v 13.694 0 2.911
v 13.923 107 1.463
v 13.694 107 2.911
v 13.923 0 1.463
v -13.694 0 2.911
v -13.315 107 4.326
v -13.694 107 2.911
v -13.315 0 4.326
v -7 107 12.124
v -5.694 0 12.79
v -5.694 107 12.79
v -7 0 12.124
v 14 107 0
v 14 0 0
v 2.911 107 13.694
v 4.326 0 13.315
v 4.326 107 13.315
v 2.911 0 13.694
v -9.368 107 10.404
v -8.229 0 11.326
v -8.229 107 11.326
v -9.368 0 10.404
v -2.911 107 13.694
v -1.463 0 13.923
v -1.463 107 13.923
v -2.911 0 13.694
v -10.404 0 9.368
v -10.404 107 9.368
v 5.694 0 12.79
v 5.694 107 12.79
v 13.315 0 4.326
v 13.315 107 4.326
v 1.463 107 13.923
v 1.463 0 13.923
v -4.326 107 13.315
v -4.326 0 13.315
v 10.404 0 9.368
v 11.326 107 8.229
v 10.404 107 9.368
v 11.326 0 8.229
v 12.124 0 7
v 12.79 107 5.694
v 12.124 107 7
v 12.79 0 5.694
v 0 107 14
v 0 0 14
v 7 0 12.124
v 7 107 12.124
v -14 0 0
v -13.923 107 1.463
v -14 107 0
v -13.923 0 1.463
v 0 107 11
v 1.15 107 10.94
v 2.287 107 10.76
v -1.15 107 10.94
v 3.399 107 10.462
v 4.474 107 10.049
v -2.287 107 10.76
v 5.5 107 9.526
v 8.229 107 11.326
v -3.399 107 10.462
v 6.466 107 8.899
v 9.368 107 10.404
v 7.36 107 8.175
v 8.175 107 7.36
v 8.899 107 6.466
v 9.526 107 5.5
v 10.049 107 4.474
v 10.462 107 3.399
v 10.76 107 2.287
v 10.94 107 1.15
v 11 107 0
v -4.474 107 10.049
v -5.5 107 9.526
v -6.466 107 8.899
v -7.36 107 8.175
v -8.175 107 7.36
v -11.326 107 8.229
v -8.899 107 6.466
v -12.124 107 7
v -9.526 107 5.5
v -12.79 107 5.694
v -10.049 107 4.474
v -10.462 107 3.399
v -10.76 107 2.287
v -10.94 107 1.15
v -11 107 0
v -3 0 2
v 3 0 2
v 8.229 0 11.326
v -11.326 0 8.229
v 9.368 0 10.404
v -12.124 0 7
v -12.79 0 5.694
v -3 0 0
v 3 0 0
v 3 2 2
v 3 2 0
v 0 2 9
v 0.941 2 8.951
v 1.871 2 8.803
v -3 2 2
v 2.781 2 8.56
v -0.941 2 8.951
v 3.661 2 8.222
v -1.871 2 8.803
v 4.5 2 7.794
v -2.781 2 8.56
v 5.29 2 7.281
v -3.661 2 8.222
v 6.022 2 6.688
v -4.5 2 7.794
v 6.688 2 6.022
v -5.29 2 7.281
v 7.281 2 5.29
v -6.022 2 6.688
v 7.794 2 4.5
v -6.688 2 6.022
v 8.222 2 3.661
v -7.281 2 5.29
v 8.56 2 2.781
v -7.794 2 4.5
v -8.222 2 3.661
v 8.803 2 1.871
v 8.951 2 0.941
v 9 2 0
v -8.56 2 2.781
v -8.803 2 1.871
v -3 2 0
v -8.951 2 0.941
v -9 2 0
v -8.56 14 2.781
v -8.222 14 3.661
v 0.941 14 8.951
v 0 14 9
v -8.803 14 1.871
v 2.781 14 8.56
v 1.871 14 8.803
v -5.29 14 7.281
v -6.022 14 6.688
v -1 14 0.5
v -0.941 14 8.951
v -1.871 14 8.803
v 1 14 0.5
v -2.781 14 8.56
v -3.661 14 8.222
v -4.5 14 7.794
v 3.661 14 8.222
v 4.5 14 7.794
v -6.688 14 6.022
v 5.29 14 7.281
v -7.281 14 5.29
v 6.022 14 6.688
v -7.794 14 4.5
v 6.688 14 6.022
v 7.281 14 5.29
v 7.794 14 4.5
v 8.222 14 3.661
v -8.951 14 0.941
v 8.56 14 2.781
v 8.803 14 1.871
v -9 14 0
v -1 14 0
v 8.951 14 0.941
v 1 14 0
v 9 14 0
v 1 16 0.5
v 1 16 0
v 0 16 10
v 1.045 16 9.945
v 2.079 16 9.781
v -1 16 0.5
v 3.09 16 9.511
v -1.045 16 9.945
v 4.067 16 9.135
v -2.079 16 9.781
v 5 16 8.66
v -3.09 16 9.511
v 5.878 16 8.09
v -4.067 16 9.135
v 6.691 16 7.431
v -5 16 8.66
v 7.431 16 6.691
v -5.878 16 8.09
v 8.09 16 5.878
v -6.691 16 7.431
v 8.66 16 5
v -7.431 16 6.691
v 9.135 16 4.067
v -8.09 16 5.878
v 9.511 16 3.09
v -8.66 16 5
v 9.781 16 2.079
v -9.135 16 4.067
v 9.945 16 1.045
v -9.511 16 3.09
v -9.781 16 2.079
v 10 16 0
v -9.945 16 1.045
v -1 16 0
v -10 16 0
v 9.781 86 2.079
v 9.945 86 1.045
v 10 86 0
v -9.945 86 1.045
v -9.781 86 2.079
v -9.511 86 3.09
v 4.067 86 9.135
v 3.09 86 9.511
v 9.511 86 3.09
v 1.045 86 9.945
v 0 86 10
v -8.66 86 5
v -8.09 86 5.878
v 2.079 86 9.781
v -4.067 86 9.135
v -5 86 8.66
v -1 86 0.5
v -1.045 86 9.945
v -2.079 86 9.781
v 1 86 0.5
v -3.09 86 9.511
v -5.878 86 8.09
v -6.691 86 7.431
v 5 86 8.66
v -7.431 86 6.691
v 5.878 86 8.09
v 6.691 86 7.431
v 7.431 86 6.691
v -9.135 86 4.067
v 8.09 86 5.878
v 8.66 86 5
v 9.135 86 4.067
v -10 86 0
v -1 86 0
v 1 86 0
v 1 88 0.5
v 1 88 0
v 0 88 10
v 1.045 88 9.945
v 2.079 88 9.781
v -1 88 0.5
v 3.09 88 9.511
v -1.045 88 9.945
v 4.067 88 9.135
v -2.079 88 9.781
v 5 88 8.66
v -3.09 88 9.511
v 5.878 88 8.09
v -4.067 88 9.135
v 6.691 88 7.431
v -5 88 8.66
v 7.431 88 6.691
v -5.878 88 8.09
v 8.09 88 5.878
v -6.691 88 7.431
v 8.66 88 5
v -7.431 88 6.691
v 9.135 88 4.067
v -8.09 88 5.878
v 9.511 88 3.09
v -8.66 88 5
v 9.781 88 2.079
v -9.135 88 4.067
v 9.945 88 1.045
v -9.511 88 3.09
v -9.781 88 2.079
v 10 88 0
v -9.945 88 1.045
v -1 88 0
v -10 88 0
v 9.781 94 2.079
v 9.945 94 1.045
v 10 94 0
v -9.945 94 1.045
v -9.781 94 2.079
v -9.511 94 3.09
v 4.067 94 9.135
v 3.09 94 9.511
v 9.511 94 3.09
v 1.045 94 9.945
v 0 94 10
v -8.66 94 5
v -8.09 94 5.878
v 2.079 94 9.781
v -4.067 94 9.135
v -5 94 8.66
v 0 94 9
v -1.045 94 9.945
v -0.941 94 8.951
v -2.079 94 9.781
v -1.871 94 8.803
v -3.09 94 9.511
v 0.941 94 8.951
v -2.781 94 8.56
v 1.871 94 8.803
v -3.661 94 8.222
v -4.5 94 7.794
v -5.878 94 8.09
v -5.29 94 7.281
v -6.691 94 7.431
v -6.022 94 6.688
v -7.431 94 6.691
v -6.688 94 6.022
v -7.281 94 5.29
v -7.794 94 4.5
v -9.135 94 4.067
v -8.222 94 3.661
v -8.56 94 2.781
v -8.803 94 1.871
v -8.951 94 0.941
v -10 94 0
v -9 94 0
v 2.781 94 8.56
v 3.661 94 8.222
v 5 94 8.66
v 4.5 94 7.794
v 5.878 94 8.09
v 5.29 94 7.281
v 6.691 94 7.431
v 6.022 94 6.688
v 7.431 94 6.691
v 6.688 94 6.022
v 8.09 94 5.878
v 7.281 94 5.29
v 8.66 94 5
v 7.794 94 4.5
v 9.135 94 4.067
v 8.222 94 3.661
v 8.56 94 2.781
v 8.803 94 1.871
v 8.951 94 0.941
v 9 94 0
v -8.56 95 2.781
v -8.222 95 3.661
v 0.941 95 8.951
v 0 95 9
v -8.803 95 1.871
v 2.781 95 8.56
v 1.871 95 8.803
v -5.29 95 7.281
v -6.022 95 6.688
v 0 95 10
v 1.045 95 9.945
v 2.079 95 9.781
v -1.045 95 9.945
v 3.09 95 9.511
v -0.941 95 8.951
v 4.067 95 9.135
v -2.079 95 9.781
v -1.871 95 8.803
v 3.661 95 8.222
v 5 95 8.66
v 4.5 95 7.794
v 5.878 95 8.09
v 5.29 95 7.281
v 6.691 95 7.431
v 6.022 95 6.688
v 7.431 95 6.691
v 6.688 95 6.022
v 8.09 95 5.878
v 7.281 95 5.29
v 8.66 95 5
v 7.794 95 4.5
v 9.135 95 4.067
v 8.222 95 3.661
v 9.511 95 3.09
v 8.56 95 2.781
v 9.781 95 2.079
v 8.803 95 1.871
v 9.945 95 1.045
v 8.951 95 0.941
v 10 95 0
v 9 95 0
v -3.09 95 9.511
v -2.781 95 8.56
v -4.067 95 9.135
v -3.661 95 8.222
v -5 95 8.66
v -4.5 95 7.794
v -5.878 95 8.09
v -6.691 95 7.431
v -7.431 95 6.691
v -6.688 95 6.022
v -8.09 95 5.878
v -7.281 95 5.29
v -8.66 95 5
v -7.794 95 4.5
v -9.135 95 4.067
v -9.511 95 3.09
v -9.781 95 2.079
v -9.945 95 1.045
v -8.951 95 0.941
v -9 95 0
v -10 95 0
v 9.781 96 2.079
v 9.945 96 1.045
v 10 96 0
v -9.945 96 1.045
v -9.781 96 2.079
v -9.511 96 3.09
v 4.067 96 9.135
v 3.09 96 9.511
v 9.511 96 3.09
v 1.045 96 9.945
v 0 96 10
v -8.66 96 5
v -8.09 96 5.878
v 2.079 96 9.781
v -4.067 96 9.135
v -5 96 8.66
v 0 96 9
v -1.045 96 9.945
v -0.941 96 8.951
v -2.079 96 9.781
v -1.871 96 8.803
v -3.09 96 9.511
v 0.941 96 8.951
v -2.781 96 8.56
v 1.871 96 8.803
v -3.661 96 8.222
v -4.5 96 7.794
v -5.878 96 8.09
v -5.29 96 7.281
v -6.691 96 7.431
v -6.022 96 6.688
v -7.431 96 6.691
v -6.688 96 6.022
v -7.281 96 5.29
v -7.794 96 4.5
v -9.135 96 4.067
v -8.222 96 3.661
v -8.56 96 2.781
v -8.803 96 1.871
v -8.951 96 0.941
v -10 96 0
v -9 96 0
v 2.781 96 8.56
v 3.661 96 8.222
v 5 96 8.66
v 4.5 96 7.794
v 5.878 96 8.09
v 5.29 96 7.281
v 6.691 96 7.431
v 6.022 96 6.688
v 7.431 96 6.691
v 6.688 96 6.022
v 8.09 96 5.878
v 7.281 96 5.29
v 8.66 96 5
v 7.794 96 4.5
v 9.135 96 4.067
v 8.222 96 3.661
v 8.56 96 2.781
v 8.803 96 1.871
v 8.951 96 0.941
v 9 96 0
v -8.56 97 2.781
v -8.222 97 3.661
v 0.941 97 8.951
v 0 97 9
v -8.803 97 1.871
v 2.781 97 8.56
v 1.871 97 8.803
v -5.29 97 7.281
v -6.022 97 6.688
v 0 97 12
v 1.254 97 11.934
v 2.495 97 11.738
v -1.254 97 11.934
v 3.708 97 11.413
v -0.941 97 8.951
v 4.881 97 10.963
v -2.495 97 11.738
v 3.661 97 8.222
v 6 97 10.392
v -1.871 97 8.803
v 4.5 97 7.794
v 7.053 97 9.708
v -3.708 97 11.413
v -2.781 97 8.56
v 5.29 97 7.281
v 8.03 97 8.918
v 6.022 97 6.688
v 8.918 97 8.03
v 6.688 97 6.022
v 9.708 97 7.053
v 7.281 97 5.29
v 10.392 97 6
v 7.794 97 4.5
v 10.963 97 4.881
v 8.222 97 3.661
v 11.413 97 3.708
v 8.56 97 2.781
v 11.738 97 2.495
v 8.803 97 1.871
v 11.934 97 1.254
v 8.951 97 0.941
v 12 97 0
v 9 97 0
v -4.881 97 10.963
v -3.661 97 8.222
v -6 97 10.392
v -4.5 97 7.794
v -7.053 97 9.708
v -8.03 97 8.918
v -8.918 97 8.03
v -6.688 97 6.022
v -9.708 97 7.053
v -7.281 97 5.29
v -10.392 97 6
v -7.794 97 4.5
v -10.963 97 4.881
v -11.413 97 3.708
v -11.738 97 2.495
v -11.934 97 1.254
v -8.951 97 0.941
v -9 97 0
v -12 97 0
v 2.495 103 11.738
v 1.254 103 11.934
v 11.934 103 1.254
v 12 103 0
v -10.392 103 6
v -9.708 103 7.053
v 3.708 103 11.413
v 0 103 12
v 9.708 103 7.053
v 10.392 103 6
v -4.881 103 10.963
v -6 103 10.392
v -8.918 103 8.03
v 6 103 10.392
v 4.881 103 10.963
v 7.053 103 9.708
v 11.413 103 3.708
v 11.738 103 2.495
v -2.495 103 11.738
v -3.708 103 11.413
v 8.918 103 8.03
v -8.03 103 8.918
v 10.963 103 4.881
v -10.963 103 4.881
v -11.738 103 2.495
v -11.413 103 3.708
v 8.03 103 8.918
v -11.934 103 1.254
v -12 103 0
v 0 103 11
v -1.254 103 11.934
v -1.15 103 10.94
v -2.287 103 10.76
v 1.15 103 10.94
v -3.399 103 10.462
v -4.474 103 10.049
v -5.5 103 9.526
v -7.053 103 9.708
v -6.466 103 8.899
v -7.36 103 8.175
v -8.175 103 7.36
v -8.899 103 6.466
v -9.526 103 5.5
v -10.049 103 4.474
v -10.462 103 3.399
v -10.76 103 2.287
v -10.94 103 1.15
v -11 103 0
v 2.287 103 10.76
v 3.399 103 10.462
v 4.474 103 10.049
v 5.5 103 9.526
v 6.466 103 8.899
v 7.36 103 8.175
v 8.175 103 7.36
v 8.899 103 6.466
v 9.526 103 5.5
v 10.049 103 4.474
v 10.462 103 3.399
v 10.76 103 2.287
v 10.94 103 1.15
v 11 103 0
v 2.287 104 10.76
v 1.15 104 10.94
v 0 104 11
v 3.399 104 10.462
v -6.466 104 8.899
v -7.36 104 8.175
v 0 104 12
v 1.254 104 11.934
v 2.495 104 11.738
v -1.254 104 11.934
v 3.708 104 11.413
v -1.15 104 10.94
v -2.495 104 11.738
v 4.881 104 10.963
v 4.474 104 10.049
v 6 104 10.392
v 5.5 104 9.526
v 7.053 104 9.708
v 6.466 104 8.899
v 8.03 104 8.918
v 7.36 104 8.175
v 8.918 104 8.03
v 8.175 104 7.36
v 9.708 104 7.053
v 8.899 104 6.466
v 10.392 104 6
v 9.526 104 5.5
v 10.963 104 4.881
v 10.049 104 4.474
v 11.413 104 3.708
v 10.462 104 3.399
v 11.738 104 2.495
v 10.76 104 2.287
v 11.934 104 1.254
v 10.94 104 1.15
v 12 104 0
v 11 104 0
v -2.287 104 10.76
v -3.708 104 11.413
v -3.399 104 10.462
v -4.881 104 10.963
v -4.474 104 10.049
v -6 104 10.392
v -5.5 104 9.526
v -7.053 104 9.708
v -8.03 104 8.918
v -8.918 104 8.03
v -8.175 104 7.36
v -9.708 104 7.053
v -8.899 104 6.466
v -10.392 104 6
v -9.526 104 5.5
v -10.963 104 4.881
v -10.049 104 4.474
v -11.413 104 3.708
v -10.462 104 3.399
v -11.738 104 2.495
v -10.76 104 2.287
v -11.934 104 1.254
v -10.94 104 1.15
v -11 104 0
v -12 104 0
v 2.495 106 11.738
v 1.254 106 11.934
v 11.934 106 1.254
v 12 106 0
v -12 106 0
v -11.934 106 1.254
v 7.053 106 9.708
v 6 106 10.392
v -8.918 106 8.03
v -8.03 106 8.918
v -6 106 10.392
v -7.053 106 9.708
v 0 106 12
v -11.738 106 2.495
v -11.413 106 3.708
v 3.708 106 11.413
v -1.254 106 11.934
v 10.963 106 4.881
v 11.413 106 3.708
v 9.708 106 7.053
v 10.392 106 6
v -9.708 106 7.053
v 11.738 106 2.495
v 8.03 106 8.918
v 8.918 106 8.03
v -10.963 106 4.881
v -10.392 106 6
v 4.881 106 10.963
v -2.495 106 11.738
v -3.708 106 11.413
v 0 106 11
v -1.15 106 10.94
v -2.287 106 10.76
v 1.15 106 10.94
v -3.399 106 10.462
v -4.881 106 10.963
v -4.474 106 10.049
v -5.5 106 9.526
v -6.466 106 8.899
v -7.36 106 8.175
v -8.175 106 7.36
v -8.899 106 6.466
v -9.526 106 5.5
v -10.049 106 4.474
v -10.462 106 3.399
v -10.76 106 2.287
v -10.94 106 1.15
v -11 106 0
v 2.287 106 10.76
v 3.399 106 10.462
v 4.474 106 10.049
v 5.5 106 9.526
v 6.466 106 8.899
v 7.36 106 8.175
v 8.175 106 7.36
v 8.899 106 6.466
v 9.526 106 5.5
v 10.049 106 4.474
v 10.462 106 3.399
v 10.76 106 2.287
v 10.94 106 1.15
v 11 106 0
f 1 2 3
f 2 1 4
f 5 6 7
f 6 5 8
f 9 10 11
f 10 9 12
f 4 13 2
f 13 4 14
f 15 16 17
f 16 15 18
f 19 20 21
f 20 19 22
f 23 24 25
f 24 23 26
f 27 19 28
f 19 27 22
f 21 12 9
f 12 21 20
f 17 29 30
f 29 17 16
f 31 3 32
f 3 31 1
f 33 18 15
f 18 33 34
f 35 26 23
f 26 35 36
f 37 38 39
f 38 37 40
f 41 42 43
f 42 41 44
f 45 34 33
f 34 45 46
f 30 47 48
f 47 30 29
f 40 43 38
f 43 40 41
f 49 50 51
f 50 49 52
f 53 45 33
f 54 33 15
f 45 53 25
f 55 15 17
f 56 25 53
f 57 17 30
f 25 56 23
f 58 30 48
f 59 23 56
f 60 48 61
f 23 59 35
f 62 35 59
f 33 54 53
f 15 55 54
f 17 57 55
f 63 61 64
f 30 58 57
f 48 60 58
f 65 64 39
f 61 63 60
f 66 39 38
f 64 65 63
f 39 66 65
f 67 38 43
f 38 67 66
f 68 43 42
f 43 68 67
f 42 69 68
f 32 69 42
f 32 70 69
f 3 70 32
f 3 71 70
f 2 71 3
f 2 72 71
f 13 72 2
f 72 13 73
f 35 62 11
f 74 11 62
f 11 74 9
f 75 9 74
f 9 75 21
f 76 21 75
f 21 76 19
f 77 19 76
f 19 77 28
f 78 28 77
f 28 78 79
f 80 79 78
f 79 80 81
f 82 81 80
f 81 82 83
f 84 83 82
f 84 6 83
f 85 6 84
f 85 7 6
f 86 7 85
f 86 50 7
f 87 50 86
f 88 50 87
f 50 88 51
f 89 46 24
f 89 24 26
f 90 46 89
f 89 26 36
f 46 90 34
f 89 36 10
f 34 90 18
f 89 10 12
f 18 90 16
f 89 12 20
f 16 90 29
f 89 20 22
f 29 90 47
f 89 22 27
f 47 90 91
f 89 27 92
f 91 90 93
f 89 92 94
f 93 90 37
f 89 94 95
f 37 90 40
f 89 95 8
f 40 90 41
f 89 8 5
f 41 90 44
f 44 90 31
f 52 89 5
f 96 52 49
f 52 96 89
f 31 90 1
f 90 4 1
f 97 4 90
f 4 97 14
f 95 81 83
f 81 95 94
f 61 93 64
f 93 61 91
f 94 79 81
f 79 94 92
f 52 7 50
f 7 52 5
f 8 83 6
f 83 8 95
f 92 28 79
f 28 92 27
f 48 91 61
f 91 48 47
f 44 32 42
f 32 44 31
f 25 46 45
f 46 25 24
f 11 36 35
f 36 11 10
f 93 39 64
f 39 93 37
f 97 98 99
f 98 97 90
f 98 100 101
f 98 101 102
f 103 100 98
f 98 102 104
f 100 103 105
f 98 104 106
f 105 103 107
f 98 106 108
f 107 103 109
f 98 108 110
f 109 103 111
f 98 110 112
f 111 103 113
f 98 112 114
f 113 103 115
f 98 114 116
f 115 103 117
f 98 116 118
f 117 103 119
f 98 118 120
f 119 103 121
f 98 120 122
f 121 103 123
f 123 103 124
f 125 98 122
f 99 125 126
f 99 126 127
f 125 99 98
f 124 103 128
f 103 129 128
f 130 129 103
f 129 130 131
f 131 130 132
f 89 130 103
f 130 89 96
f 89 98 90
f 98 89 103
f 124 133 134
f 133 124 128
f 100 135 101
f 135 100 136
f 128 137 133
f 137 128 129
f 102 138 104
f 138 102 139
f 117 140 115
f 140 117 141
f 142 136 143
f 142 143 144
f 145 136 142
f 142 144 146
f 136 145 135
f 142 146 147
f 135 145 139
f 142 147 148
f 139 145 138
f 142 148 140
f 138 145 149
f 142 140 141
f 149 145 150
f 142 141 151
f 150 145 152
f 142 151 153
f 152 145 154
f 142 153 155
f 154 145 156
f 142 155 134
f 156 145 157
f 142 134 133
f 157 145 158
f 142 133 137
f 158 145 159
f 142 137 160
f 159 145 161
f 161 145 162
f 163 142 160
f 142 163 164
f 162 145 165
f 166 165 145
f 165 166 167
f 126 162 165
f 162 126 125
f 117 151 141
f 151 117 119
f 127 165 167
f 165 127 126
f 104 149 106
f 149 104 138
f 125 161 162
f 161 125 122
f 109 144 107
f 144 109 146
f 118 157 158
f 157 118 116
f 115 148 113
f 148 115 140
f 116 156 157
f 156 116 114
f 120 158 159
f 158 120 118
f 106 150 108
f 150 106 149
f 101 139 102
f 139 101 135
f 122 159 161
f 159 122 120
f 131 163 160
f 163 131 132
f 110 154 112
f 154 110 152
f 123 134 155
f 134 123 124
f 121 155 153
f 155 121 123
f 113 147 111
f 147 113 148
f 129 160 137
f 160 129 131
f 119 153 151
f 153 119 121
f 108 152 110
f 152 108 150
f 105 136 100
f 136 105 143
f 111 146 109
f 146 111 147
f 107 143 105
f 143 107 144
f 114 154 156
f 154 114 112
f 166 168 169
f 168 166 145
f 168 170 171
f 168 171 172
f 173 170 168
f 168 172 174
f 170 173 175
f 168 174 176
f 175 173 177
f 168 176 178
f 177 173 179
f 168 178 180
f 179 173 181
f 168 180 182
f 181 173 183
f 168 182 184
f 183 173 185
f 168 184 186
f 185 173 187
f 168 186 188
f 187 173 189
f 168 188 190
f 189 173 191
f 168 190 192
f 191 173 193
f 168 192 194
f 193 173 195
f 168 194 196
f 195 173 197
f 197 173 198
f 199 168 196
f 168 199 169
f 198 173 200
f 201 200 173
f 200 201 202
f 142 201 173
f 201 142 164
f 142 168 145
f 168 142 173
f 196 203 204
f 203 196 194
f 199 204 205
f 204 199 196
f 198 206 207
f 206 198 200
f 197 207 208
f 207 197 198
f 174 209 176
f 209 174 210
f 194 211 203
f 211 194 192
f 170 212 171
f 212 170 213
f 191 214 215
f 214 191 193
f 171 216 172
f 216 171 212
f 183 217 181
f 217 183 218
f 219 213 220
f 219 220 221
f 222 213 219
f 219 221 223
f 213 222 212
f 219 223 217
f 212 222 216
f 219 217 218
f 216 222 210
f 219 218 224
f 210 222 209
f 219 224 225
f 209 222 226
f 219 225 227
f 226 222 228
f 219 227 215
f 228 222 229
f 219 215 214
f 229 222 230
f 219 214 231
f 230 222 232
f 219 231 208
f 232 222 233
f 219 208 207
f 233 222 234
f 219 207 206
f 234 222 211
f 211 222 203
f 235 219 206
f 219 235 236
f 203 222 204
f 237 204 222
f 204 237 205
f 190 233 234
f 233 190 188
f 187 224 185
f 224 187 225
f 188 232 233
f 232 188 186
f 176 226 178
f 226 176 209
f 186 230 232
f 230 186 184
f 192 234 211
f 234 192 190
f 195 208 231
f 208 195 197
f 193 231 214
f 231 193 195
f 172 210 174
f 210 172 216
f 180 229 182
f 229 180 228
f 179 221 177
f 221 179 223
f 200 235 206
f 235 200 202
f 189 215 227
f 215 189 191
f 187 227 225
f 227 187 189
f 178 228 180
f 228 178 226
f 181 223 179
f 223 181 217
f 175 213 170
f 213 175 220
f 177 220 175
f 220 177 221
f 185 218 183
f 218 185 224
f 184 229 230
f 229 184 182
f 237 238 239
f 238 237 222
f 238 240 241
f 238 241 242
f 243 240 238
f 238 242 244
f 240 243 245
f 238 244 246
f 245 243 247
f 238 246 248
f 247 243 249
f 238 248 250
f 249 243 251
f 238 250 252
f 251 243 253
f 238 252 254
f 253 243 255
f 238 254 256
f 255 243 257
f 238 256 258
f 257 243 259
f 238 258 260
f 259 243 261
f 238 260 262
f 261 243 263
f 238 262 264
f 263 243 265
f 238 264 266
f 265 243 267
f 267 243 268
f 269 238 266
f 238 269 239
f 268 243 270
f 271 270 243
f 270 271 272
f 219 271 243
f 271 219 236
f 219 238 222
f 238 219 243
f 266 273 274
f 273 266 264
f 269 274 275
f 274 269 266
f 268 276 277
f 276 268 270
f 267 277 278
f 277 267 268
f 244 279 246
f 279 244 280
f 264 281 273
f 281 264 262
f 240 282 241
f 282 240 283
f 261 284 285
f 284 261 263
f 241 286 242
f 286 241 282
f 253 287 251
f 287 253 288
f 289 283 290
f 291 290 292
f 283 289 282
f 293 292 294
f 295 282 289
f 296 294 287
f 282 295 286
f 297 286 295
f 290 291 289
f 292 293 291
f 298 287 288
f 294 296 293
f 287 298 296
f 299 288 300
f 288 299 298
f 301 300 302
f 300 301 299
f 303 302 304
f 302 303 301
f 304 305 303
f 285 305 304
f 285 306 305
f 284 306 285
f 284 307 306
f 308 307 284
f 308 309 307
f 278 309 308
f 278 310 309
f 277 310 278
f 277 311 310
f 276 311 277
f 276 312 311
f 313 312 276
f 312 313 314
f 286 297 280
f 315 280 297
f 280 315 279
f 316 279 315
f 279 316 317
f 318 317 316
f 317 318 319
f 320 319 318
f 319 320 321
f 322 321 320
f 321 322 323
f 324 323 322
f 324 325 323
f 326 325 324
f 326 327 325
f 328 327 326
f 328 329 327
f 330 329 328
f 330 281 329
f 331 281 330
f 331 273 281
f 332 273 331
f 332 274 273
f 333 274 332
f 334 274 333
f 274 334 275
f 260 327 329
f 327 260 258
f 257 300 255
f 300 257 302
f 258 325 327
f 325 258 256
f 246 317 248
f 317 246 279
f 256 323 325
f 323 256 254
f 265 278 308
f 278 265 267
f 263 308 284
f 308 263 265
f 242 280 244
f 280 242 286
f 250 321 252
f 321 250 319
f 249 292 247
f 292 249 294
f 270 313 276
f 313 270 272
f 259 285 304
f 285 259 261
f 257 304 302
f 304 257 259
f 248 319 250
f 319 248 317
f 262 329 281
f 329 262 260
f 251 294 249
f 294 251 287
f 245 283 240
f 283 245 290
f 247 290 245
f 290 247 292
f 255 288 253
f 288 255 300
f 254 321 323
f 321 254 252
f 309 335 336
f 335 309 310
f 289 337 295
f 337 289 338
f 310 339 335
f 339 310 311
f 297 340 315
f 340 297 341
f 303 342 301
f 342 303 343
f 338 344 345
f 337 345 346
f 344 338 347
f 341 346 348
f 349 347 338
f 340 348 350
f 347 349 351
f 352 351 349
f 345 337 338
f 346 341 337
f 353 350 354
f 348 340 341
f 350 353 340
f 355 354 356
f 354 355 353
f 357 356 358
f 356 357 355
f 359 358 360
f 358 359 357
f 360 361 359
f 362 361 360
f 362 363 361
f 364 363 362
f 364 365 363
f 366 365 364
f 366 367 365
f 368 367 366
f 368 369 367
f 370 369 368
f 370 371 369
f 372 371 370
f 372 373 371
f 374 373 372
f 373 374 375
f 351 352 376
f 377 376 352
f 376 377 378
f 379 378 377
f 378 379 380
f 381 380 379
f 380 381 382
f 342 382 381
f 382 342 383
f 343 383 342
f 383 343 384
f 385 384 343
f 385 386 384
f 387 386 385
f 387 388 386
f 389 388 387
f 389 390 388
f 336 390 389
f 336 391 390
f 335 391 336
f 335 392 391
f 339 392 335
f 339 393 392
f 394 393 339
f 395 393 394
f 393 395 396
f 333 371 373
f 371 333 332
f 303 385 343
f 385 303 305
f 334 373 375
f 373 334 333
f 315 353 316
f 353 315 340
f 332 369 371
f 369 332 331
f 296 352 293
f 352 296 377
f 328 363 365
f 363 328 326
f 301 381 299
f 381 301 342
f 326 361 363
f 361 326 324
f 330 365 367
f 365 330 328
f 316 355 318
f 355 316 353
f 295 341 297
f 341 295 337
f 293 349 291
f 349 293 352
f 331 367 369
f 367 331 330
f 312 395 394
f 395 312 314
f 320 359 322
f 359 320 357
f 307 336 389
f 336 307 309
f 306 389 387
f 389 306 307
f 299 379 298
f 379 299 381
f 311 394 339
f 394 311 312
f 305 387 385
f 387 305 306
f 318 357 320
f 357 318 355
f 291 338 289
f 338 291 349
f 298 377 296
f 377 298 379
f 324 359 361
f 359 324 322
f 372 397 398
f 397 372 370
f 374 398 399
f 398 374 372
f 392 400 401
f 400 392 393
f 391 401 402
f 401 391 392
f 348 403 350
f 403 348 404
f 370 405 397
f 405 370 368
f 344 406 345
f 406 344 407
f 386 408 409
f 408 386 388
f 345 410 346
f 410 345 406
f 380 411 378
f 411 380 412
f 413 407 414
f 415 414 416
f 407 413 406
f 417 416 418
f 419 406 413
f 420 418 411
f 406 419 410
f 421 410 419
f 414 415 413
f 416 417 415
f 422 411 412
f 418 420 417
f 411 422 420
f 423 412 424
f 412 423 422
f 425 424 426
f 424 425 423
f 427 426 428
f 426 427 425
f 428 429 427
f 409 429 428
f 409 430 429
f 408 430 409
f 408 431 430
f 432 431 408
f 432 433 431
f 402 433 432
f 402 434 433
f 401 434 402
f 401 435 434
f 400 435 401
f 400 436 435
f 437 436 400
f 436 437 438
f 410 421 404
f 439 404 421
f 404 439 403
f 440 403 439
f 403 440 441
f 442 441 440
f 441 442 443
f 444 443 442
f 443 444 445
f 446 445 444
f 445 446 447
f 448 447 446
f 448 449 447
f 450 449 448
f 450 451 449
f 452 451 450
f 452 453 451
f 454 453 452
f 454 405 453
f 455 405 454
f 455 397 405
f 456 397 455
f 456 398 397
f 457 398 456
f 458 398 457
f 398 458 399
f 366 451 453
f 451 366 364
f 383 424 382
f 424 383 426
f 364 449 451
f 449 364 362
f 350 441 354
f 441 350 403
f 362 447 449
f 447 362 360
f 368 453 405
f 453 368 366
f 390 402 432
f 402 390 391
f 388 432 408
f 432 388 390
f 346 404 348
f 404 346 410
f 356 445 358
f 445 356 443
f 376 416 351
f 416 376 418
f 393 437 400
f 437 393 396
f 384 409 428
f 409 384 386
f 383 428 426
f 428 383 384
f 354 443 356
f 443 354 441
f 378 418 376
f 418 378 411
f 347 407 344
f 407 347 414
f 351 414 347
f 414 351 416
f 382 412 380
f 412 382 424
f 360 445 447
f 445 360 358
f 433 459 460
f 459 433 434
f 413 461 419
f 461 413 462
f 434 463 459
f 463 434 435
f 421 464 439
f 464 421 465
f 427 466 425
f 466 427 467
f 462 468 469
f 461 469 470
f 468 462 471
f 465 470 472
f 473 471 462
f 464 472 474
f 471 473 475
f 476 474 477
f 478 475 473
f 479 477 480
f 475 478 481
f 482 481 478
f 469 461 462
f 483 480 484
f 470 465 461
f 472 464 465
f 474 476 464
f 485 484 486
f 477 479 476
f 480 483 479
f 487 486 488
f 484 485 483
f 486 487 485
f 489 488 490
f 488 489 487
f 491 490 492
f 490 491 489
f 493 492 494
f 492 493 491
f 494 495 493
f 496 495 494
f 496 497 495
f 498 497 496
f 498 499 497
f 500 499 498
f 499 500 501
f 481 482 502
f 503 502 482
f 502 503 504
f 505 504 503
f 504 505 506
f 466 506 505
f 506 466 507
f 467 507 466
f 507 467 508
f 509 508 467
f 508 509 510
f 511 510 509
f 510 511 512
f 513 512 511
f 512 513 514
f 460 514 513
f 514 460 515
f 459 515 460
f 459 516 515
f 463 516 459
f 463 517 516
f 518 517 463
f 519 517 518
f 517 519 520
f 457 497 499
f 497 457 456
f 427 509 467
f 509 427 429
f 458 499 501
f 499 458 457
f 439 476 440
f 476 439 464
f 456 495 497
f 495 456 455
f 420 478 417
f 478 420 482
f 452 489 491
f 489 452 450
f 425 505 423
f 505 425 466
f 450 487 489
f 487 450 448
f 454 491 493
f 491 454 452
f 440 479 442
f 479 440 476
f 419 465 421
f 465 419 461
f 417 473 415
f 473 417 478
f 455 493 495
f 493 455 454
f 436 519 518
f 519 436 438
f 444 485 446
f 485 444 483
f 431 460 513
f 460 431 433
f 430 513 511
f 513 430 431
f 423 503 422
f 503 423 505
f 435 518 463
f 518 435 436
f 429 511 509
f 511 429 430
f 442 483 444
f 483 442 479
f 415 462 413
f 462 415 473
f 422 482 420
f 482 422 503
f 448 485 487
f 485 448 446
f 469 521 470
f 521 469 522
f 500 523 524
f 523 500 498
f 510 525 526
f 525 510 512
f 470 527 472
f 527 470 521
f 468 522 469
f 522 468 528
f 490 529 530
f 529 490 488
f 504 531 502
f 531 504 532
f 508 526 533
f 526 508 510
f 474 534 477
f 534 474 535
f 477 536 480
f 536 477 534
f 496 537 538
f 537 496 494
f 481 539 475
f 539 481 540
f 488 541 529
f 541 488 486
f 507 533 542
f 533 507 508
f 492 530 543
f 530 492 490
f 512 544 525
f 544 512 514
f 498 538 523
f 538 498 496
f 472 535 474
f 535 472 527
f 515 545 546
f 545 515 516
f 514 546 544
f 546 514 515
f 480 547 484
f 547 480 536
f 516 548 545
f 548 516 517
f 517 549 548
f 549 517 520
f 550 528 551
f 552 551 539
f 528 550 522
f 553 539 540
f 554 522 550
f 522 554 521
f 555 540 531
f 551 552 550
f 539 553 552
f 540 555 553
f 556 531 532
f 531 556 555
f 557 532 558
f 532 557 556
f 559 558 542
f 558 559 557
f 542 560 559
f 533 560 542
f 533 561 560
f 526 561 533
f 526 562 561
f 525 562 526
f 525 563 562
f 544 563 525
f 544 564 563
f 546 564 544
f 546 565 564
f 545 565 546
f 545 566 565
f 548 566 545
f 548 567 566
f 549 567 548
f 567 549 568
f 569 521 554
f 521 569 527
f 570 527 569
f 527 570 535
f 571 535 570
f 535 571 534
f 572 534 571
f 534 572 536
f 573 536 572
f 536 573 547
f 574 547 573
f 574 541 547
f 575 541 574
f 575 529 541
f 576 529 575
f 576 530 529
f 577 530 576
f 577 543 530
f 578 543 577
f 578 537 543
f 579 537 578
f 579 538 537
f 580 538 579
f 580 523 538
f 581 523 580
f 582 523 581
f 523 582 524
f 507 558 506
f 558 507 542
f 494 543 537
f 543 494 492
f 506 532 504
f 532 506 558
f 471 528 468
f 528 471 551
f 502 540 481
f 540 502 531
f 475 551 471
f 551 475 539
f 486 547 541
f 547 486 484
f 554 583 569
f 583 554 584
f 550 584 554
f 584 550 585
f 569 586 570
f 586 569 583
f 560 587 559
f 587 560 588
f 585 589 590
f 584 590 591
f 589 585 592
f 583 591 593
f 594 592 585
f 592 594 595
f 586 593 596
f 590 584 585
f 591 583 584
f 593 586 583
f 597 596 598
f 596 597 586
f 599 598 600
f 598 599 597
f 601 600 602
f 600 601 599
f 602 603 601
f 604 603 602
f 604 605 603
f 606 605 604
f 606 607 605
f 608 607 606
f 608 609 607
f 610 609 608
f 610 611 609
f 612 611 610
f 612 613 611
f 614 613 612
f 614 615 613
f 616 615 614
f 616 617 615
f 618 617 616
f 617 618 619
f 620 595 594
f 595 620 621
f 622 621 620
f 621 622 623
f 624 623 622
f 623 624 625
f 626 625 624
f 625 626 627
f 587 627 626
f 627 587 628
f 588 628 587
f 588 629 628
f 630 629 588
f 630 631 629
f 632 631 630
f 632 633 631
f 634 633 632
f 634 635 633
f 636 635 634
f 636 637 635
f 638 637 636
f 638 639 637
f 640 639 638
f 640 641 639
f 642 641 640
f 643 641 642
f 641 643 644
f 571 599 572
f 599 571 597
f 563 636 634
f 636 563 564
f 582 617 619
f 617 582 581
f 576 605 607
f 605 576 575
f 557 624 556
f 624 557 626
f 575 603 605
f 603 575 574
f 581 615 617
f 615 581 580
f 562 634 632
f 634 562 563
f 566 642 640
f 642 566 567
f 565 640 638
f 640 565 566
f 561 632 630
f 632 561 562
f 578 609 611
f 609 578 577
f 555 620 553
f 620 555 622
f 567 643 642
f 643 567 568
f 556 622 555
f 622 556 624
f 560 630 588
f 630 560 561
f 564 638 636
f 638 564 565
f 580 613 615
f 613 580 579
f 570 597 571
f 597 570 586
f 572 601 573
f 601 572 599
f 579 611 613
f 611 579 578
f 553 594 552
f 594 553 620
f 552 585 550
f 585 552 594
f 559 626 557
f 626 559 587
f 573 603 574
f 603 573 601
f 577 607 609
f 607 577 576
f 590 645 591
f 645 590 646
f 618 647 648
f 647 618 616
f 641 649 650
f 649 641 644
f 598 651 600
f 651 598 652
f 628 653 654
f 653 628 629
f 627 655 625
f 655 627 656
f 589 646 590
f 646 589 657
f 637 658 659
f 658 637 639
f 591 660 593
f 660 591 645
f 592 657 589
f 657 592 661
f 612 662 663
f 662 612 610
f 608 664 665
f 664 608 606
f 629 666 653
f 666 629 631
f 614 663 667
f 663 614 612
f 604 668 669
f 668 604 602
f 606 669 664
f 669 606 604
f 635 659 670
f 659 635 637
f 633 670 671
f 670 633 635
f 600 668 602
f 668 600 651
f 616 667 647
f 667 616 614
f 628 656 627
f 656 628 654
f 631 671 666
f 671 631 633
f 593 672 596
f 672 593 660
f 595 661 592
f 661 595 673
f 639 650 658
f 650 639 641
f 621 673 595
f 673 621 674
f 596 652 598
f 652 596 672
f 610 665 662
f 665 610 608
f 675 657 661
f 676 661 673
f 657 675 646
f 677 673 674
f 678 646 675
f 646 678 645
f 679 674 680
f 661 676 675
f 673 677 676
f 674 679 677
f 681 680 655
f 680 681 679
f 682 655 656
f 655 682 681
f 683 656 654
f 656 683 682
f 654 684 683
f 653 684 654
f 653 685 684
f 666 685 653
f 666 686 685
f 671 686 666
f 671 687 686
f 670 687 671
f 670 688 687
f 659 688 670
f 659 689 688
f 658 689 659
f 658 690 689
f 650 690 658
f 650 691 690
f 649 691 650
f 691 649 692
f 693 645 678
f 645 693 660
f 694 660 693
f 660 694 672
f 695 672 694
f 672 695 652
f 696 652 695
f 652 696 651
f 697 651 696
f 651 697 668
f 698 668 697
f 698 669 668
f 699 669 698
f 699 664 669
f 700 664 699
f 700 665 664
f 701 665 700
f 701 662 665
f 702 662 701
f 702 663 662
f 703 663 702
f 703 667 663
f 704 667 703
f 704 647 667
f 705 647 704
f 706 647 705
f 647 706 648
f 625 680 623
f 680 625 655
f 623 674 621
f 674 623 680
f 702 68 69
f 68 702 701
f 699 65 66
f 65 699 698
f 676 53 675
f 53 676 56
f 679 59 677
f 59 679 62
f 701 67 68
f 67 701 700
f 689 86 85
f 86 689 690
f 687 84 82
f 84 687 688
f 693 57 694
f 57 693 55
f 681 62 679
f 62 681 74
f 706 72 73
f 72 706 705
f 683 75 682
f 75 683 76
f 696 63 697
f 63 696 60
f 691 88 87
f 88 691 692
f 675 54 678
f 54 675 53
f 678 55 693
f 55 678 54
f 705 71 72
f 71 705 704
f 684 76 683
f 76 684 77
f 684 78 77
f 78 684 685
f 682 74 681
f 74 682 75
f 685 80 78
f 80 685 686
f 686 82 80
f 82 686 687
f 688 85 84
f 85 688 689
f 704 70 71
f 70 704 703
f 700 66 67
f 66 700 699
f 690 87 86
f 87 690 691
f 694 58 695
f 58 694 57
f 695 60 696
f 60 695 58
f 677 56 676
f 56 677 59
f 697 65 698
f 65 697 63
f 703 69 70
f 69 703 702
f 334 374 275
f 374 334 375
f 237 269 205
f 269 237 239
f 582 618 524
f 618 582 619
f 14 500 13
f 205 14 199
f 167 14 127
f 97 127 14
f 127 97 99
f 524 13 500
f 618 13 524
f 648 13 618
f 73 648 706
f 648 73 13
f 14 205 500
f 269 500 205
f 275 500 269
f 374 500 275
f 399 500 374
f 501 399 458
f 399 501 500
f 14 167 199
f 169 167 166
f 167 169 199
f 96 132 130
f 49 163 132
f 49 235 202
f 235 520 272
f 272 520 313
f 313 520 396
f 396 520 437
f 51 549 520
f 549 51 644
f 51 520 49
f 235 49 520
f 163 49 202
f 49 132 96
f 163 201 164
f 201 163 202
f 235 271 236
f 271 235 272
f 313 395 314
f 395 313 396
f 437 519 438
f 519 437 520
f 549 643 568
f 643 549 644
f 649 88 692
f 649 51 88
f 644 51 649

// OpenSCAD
$fn = 60;

thick=2;

switchlen=12;
switchwid=9;
batterylen=70;
batterywid=9;
airflowlen=6;
airflowwid=10;
pcblen=1;
pcbwid=10;
ledlen=6;
ledwid=12;
lenslen=2;
lenswid=12;

wiredia=1;

notchlen=1;
notchwid=1;

function width() = max(switchwid,batterywid,airflowwid,pcbwid,ledwid,lenswid)+thick;
function length() = thick+switchlen+thick+batterylen+thick+airflowlen+notchlen+pcblen+notchlen+ledlen+notchlen+lenslen+notchlen;

rotate([-90,0,0]) {
  difference() {
    // The outer body
    cylinder(h=length(), r=width());

    // Switch Opening
    translate([-3,-2,0]) {
      cube([6,4,thick]);
    }

    // Switch compartment
    translate([0,0,thick]) {
      cylinder(h=switchlen, r=switchwid);
    }

    // Wire hole
    translate([-wiredia,-wiredia/2,thick+switchlen]) {
      cube([2*wiredia,wiredia,thick]);
    }

    // Battery compartment
    translate([0,0,thick+switchlen+thick]) {
      cylinder(h=batterylen, r=batterywid+wiredia);
    }

    // Wire hole
    translate([-wiredia,-wiredia/2,thick+switchlen+thick+batterylen]) {
      cube([2*wiredia,wiredia,thick]);
    }

    // LED airflow compartment
    translate([0,0,thick+switchlen+thick+batterylen+thick]) {
      cylinder(h=airflowlen, r=airflowwid);
    }

    // PCB
    translate([0,0,thick+switchlen+thick+batterylen+thick+airflowlen]) {
      cylinder(h=1, r=pcbwid-notchwid);
    }
    translate([0,0,thick+switchlen+thick+batterylen+thick+airflowlen+notchlen]) {
      cylinder(h=pcblen, r=pcbwid);
    }
    translate([0,0,thick+switchlen+thick+batterylen+thick+airflowlen+notchlen+pcblen]) {
      cylinder(h=1, r=pcbwid-notchwid);
    }

    // LED compartment
    translate([0,0,thick+switchlen+thick+batterylen+thick+airflowlen+notchlen+pcblen+notchlen]) {
      cylinder(h=ledlen, r=ledwid);
    }

    // Lens
    translate([0,0,thick+switchlen+thick+batterylen+thick+airflowlen+notchlen+pcblen+notchlen+ledlen]) {
      cylinder(h=1, r=lenswid-notchwid);
    }
    translate([0,0,thick+switchlen+thick+batterylen+thick+airflowlen+notchlen+pcblen+notchlen+ledlen+notchlen]) {
      cylinder(h=lenslen, r=lenswid);
    }
    translate([0,0,thick+switchlen+thick+batterylen+thick+airflowlen+notchlen+pcblen+notchlen+ledlen+notchlen+lenslen]) {
      cylinder(h=1, r=lenswid-notchwid);
    }

    // Cleave it in twain
    translate([-width(),0,0]) {
      cube([2*width(),width(),length()]);
    }
  }
}

echo();
echo("***");
echo("STATS:");
echo(str("Final length = ", length(), "mm"));
echo(str("Final width = ", 2*width(), "mm"));
echo("***");
echo();
